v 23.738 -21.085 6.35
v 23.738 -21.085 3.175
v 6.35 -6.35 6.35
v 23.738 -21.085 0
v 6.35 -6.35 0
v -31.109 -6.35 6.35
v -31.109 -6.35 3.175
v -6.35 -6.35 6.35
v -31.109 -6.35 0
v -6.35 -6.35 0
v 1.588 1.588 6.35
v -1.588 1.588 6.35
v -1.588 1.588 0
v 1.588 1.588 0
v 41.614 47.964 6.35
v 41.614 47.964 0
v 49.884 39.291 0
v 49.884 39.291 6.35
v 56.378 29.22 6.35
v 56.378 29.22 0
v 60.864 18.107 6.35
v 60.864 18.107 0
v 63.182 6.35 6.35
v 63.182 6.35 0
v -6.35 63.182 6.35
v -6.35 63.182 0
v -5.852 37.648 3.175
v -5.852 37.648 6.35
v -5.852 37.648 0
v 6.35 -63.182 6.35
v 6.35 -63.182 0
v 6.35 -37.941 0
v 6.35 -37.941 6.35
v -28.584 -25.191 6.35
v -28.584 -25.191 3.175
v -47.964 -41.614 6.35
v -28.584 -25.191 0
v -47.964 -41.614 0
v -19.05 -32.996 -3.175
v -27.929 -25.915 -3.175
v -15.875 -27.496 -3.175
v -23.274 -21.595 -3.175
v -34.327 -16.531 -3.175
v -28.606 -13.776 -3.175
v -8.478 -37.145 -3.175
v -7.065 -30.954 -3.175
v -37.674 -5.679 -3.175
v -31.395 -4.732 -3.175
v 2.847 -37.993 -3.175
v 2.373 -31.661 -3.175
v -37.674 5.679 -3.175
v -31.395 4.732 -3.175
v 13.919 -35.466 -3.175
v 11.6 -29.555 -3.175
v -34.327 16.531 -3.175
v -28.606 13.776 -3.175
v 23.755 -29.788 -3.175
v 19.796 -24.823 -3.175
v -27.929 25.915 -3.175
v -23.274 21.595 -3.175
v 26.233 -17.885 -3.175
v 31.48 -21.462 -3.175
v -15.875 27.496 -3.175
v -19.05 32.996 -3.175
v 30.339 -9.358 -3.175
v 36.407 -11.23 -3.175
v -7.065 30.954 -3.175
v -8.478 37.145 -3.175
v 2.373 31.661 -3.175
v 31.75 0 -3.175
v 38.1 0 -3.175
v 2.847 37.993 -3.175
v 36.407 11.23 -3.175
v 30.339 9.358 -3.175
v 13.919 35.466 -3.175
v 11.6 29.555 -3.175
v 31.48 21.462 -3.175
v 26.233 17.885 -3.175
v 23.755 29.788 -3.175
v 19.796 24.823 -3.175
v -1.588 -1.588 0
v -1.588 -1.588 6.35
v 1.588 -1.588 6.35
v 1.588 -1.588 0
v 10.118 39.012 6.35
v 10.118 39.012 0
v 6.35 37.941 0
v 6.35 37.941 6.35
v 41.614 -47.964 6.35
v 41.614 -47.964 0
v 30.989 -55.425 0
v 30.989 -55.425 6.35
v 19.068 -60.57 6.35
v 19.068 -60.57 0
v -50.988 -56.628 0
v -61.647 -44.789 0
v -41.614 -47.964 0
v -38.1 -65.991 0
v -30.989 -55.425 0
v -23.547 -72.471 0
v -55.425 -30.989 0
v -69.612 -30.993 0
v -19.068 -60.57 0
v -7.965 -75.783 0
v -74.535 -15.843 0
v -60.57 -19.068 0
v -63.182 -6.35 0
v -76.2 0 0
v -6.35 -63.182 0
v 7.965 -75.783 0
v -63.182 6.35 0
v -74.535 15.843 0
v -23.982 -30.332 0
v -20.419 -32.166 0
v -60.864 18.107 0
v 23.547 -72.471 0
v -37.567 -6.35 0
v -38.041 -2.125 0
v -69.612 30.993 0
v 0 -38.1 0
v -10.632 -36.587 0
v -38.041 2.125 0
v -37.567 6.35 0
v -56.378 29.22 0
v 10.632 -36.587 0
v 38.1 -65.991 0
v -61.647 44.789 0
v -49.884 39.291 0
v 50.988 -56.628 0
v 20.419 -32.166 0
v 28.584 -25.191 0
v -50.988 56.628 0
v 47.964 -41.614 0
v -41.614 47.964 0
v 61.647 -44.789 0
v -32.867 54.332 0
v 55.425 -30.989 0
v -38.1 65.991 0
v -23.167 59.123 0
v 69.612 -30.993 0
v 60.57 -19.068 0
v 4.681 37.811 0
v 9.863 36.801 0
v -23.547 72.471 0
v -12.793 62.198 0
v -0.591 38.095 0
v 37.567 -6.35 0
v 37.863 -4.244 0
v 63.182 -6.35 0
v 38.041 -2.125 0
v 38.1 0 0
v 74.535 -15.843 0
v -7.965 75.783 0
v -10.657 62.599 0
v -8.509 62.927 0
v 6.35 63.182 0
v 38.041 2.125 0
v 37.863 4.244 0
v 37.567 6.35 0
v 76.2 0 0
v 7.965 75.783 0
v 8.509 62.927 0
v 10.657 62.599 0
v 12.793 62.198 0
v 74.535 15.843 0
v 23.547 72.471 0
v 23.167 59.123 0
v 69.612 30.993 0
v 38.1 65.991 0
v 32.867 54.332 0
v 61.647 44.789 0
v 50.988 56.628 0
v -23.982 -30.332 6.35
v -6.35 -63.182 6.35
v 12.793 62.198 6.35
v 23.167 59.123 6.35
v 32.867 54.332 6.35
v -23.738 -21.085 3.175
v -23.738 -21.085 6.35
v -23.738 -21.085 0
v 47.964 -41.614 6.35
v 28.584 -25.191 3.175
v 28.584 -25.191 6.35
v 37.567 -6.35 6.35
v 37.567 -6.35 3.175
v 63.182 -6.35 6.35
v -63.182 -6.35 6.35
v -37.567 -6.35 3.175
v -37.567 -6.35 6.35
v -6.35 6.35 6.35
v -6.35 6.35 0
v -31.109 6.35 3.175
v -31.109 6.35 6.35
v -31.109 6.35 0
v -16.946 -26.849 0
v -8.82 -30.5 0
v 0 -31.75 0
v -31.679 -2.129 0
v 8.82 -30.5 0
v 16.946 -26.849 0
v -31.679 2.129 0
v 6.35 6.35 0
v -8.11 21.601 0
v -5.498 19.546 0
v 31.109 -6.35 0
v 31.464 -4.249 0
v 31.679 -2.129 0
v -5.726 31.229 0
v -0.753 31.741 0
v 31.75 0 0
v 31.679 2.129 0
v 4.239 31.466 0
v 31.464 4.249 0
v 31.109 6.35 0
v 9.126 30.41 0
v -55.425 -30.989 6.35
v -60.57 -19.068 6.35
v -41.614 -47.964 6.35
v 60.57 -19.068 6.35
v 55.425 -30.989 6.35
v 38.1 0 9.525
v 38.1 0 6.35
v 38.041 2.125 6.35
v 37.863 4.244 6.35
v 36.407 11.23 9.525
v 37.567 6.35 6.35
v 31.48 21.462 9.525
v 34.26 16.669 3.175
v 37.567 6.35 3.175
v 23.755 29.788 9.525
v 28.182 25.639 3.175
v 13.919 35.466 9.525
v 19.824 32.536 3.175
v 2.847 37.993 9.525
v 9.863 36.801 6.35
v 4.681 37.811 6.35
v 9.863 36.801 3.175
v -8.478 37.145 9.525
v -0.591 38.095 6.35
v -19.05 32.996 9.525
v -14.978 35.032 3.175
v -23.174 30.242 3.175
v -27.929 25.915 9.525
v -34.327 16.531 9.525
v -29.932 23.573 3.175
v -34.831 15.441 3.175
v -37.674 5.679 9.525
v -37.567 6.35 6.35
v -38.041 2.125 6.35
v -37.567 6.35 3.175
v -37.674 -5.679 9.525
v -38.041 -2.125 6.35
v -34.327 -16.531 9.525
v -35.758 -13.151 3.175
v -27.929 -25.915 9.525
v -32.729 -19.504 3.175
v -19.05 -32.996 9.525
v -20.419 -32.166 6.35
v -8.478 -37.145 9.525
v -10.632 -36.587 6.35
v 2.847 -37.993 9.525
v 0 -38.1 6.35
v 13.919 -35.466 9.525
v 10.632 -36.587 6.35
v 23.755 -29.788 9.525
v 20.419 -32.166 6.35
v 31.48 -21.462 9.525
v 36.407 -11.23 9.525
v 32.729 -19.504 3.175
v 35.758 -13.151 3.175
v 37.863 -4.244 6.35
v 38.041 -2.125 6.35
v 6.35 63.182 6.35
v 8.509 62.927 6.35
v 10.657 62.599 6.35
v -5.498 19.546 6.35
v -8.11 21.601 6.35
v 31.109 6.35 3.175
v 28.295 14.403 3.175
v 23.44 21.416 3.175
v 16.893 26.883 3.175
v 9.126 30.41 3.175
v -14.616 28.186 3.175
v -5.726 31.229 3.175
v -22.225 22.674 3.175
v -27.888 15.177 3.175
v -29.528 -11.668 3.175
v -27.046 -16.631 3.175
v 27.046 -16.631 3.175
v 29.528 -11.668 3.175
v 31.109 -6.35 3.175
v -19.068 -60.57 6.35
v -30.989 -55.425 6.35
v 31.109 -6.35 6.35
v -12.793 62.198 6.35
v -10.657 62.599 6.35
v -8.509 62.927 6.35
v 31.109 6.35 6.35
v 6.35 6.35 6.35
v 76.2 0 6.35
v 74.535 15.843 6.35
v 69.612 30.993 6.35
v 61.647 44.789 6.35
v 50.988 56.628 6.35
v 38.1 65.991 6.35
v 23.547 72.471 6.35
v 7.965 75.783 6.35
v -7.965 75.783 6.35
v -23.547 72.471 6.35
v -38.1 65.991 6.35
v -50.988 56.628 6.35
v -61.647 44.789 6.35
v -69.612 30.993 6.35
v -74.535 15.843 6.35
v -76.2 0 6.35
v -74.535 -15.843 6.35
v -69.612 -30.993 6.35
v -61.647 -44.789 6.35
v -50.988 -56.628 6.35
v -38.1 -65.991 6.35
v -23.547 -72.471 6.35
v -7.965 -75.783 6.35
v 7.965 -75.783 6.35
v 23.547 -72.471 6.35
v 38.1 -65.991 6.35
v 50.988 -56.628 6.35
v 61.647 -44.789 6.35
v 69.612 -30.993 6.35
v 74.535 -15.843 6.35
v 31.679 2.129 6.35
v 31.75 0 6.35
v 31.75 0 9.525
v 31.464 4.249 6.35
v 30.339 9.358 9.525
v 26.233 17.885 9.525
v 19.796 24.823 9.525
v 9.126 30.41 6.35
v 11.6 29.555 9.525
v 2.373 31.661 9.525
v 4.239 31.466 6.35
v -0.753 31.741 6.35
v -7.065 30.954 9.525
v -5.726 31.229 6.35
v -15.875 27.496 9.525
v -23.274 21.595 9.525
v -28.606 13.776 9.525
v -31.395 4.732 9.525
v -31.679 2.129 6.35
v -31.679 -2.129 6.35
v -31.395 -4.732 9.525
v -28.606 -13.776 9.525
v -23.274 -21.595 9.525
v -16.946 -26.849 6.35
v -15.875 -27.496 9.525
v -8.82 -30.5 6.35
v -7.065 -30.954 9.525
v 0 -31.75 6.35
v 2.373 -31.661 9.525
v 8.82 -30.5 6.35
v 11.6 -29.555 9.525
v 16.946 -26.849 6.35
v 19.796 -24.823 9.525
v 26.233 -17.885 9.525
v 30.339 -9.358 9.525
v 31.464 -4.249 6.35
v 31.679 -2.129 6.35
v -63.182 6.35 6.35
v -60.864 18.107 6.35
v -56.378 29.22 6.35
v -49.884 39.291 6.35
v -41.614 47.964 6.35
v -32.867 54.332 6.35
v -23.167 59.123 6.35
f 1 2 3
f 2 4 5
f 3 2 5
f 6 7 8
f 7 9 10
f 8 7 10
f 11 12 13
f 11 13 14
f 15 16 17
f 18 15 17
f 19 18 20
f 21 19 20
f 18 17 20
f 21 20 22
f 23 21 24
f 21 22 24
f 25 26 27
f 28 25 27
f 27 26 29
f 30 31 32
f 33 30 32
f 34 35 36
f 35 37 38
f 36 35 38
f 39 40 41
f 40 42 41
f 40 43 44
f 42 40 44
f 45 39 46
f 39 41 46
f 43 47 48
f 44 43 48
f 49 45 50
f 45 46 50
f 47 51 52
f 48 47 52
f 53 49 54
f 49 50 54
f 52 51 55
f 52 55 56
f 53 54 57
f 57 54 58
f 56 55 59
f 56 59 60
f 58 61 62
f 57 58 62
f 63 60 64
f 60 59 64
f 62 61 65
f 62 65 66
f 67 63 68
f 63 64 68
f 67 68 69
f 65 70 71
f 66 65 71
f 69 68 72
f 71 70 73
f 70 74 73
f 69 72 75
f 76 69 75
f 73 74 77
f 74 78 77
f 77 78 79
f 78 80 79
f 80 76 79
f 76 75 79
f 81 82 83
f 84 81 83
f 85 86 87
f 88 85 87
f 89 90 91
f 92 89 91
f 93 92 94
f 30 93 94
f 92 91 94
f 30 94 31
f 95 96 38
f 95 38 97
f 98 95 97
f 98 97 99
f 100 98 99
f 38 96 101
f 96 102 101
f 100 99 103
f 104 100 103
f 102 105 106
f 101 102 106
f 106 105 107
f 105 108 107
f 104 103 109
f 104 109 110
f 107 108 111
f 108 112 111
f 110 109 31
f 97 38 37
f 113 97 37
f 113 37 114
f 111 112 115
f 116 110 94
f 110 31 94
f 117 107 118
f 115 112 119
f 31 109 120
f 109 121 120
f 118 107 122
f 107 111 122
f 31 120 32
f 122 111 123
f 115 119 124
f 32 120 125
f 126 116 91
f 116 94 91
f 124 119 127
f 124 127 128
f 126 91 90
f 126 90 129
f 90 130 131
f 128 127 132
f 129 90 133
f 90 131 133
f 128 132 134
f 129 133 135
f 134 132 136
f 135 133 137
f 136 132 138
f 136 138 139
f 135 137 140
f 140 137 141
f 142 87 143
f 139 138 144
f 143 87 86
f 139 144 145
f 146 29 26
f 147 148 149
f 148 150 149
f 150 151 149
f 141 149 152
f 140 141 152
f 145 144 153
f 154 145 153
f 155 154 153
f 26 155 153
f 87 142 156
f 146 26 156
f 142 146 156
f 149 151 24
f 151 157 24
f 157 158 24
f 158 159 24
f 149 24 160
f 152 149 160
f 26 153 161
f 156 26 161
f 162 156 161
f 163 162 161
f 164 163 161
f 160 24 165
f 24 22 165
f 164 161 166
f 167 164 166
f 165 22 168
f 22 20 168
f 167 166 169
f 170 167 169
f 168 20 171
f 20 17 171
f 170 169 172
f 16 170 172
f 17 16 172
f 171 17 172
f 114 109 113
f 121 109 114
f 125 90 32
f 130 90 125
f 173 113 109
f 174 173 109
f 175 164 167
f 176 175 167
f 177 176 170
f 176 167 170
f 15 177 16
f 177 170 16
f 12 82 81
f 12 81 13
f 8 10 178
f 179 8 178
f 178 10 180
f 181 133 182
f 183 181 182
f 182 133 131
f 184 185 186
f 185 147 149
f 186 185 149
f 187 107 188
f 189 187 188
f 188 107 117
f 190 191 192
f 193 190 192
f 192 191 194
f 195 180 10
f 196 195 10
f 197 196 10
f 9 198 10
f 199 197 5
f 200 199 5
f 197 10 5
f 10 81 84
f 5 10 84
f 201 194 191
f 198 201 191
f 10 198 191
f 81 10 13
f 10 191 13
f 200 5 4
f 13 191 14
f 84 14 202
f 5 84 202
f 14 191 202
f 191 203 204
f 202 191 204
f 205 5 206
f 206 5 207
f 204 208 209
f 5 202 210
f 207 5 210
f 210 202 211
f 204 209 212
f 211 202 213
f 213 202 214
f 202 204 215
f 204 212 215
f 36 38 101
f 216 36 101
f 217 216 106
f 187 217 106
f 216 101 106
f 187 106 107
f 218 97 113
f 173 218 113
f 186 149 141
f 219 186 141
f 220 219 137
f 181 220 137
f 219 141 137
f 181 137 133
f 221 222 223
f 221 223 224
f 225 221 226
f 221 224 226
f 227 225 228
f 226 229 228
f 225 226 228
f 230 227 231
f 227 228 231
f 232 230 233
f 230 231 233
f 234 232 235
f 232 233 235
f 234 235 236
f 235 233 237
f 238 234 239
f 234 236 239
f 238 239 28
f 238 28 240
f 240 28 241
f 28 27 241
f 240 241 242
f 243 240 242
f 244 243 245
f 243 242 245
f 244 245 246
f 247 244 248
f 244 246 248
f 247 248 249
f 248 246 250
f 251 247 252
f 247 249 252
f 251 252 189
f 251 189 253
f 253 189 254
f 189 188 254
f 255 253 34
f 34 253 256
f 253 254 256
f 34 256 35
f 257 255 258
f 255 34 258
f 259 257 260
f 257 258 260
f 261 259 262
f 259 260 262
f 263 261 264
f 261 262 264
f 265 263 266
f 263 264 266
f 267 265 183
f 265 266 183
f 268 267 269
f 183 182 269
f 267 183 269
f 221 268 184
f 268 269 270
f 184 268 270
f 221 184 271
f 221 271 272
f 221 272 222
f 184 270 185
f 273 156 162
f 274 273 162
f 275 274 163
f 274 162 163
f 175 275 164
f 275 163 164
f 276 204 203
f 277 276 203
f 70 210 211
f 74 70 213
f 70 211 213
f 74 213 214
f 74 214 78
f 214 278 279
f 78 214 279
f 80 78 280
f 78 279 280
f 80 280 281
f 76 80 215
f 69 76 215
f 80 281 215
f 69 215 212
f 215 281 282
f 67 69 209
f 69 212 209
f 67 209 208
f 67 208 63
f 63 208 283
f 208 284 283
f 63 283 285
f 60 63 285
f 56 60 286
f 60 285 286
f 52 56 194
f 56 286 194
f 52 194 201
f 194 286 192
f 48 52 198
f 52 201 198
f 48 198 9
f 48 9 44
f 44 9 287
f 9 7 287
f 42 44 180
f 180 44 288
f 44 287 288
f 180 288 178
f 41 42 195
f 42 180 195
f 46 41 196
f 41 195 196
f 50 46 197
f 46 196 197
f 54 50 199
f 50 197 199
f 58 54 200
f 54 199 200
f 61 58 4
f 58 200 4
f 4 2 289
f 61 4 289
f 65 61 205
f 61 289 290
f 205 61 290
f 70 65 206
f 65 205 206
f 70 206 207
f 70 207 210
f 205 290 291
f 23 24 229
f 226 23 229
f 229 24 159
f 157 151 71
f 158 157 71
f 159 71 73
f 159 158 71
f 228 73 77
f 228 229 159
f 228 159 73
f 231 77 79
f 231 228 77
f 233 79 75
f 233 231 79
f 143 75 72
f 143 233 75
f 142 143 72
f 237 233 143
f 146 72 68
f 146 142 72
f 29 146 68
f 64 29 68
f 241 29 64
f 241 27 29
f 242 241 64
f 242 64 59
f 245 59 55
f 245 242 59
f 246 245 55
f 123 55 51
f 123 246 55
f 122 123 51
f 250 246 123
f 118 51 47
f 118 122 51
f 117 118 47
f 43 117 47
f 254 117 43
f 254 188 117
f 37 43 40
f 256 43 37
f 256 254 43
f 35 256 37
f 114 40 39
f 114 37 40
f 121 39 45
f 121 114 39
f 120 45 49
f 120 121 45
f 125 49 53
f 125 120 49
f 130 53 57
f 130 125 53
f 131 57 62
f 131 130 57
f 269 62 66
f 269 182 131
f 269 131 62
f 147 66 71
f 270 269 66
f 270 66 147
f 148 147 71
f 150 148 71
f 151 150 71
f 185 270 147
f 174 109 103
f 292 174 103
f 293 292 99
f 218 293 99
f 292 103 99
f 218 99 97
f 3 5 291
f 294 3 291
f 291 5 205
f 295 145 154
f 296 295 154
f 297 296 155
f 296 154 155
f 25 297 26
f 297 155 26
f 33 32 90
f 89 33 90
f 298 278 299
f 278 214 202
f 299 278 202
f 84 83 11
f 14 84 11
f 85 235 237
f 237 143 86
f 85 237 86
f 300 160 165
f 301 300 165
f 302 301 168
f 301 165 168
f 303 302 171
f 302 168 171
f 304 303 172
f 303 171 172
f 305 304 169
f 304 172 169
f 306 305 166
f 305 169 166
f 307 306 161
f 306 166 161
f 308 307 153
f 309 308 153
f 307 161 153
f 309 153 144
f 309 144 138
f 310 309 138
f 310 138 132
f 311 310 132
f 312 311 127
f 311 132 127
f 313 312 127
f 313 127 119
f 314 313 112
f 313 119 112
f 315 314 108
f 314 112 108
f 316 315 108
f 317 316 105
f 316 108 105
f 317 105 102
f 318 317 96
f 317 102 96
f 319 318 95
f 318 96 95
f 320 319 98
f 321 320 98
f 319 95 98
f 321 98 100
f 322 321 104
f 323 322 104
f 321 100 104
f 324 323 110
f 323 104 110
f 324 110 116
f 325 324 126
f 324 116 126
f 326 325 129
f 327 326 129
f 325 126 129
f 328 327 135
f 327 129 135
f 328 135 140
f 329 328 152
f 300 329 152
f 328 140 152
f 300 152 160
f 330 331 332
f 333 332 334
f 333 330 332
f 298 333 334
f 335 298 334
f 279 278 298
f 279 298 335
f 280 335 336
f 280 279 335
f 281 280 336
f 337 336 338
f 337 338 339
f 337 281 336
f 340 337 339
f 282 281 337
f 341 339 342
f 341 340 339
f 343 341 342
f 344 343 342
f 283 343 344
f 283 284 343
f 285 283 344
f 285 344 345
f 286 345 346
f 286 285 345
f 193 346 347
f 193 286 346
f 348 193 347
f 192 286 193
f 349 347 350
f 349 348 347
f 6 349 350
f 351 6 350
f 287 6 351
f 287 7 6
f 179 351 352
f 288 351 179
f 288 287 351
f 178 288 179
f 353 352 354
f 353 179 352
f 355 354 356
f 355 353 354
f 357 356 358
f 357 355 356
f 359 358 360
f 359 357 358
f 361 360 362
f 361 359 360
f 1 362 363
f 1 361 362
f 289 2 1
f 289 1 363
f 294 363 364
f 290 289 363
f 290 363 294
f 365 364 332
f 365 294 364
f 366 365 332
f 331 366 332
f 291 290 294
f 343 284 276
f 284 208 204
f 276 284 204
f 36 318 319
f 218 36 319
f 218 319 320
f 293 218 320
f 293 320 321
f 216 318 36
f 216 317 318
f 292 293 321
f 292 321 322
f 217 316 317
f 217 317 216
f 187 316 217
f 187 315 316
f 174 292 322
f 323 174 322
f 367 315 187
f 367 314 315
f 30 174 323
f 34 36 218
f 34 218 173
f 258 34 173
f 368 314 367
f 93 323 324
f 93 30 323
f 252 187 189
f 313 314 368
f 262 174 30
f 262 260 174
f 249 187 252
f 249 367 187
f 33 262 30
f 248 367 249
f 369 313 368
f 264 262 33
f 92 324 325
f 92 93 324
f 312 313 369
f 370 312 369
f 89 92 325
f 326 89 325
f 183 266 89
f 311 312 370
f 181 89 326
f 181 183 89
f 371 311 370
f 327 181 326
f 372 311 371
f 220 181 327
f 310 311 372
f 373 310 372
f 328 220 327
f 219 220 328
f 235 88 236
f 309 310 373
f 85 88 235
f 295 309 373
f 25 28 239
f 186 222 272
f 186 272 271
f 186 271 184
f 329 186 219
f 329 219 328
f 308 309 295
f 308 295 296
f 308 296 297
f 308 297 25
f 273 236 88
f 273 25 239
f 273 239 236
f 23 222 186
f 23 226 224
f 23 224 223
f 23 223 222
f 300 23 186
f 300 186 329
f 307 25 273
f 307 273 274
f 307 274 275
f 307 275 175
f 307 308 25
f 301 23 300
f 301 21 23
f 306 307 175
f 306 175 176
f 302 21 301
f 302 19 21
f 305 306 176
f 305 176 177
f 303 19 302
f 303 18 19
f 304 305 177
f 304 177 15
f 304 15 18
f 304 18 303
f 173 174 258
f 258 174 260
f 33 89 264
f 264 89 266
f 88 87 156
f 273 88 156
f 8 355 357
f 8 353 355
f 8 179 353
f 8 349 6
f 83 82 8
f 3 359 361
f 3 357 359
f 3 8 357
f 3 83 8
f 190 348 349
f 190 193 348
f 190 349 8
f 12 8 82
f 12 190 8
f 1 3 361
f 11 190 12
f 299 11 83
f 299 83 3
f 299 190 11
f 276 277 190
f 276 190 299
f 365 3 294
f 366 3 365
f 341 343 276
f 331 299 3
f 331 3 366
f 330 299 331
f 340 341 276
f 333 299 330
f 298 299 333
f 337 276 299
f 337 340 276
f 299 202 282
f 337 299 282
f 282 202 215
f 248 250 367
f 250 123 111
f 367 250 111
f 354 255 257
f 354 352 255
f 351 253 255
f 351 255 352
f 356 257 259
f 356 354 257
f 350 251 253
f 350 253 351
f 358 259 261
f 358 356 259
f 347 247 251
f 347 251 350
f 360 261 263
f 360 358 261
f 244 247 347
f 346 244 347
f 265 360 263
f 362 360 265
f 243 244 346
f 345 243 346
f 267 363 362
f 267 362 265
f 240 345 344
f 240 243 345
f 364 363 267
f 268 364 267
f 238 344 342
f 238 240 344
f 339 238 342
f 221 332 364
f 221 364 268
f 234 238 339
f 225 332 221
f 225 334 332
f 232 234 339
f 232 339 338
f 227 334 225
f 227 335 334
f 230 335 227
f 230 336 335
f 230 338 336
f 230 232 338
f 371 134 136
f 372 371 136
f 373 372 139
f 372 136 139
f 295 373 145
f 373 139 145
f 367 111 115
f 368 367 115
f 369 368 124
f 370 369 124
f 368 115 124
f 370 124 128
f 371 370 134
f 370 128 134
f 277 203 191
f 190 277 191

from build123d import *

# Parameters (mm, degrees)
F0_R          = 76.2
F1_DEPTH      = 6.35
F3_R          = 38.1
F3_R_2        = 31.75
F4_DEPTH      = 6.35
F4_DEPTH_BACK = 6.35
F5_W          = 3.175
F5_H          = 3.175
F6_DEPTH      = 12.7


with BuildPart() as f1:
    # F0 (on Top) → F1 (new body)
    with BuildSketch(Plane.XY):
        Circle(F0_R)
        with BuildLine():
            Line((-41.613887, -47.963887), (-23.981943, -30.331943))
            Line((-23.981943, -30.331943), (-6.35, -63.181702))
            ThreePointArc((-6.35, -63.181702), (-25.160069, -58.302838), (-41.613887, -47.963887))
        make_face(mode=Mode.SUBTRACT)
        with BuildLine():
            ThreePointArc((-47.963887, -41.613887), (-58.302838, -25.160069), (-63.181702, -6.35))
            Line((-63.181702, -6.35), (-6.35, -6.35))
            Line((-6.35, -6.35), (-47.963887, -41.613887))
        make_face(mode=Mode.SUBTRACT)
        with BuildLine():
            Line((6.35, -63.181702), (6.35, -37.940851))
            Line((6.35, -37.940851), (41.613887, -47.963887))
            ThreePointArc((41.613887, -47.963887), (25.160069, -58.302838), (6.35, -63.181702))
        make_face(mode=Mode.SUBTRACT)
        with BuildLine():
            Line((47.963887, -41.613887), (6.35, -6.35))
            Line((6.35, -6.35), (63.181702, -6.35))
            ThreePointArc((63.181702, -6.35), (58.302838, -25.160069), (47.963887, -41.613887))
        make_face(mode=Mode.SUBTRACT)
        with BuildLine():
            Line((-6.35, 63.181702), (-5.498498, 19.546218))
            Line((-5.498498, 19.546218), (-8.109563, 21.600755))
            Line((-8.109563, 21.600755), (-6.35, 6.35))
            Line((-6.35, 6.35), (-63.181702, 6.35))
            ThreePointArc((-63.181702, 6.35), (-56.377813, 29.219723), (-41.613887, 47.963887))
            ThreePointArc((-41.613887, 47.963887), (-28.119246, 56.934682), (-12.793478, 62.197885))
            ThreePointArc((-12.793478, 62.197885), (-9.584371, 62.772525), (-6.35, 63.181702))
        make_face(mode=Mode.SUBTRACT)
        with BuildLine():
            Line((10.118387, 39.011938), (6.35, 37.940851))
            Line((6.35, 37.940851), (6.35, 63.181702))
            ThreePointArc((6.35, 63.181702), (9.584371, 62.772525), (12.793478, 62.197885))
            ThreePointArc((12.793478, 62.197885), (28.119246, 56.934682), (41.613887, 47.963887))
            ThreePointArc((41.613887, 47.963887), (56.377813, 29.219723), (63.181702, 6.35))
            Line((63.181702, 6.35), (6.35, 6.35))
            Line((6.35, 6.35), (10.118387, 39.011938))
        make_face(mode=Mode.SUBTRACT)
    extrude(amount=F1_DEPTH)

    # F3 (on offset) → F4 (join, two sides)
    with BuildSketch(Plane.XY.offset(3.175)) as f4_sk:
        Circle(F3_R)
        Circle(F3_R_2, mode=Mode.SUBTRACT)
    extrude(amount=F4_DEPTH)
    extrude(f4_sk.sketch, amount=-F4_DEPTH_BACK)

    # F5 (on Top) → F6 (cut, symmetric)
    with BuildSketch(Plane.XY):
        Rectangle(F5_W, F5_H)
    extrude(amount=F6_DEPTH, both=True, mode=Mode.SUBTRACT)


solid = f1.part
